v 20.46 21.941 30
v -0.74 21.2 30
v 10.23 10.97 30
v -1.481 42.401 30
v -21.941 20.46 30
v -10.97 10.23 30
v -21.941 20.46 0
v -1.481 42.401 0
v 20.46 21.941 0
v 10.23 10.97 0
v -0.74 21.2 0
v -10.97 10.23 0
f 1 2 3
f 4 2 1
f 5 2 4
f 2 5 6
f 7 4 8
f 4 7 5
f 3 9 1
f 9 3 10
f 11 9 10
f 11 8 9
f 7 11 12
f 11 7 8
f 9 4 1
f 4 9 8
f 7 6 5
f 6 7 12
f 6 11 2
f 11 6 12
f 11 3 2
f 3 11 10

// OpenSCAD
rotate([0,0,2])
rotate([0,-90,0]){
    difference(){
        rotate([-45,0,0]) {
            cube([30, 30, 30]);
        }
        scale([1,0.5,0.5]) {
            rotate([-45,0,0]) {
                cube([30, 30, 30]);
            }
        }
    }
}
